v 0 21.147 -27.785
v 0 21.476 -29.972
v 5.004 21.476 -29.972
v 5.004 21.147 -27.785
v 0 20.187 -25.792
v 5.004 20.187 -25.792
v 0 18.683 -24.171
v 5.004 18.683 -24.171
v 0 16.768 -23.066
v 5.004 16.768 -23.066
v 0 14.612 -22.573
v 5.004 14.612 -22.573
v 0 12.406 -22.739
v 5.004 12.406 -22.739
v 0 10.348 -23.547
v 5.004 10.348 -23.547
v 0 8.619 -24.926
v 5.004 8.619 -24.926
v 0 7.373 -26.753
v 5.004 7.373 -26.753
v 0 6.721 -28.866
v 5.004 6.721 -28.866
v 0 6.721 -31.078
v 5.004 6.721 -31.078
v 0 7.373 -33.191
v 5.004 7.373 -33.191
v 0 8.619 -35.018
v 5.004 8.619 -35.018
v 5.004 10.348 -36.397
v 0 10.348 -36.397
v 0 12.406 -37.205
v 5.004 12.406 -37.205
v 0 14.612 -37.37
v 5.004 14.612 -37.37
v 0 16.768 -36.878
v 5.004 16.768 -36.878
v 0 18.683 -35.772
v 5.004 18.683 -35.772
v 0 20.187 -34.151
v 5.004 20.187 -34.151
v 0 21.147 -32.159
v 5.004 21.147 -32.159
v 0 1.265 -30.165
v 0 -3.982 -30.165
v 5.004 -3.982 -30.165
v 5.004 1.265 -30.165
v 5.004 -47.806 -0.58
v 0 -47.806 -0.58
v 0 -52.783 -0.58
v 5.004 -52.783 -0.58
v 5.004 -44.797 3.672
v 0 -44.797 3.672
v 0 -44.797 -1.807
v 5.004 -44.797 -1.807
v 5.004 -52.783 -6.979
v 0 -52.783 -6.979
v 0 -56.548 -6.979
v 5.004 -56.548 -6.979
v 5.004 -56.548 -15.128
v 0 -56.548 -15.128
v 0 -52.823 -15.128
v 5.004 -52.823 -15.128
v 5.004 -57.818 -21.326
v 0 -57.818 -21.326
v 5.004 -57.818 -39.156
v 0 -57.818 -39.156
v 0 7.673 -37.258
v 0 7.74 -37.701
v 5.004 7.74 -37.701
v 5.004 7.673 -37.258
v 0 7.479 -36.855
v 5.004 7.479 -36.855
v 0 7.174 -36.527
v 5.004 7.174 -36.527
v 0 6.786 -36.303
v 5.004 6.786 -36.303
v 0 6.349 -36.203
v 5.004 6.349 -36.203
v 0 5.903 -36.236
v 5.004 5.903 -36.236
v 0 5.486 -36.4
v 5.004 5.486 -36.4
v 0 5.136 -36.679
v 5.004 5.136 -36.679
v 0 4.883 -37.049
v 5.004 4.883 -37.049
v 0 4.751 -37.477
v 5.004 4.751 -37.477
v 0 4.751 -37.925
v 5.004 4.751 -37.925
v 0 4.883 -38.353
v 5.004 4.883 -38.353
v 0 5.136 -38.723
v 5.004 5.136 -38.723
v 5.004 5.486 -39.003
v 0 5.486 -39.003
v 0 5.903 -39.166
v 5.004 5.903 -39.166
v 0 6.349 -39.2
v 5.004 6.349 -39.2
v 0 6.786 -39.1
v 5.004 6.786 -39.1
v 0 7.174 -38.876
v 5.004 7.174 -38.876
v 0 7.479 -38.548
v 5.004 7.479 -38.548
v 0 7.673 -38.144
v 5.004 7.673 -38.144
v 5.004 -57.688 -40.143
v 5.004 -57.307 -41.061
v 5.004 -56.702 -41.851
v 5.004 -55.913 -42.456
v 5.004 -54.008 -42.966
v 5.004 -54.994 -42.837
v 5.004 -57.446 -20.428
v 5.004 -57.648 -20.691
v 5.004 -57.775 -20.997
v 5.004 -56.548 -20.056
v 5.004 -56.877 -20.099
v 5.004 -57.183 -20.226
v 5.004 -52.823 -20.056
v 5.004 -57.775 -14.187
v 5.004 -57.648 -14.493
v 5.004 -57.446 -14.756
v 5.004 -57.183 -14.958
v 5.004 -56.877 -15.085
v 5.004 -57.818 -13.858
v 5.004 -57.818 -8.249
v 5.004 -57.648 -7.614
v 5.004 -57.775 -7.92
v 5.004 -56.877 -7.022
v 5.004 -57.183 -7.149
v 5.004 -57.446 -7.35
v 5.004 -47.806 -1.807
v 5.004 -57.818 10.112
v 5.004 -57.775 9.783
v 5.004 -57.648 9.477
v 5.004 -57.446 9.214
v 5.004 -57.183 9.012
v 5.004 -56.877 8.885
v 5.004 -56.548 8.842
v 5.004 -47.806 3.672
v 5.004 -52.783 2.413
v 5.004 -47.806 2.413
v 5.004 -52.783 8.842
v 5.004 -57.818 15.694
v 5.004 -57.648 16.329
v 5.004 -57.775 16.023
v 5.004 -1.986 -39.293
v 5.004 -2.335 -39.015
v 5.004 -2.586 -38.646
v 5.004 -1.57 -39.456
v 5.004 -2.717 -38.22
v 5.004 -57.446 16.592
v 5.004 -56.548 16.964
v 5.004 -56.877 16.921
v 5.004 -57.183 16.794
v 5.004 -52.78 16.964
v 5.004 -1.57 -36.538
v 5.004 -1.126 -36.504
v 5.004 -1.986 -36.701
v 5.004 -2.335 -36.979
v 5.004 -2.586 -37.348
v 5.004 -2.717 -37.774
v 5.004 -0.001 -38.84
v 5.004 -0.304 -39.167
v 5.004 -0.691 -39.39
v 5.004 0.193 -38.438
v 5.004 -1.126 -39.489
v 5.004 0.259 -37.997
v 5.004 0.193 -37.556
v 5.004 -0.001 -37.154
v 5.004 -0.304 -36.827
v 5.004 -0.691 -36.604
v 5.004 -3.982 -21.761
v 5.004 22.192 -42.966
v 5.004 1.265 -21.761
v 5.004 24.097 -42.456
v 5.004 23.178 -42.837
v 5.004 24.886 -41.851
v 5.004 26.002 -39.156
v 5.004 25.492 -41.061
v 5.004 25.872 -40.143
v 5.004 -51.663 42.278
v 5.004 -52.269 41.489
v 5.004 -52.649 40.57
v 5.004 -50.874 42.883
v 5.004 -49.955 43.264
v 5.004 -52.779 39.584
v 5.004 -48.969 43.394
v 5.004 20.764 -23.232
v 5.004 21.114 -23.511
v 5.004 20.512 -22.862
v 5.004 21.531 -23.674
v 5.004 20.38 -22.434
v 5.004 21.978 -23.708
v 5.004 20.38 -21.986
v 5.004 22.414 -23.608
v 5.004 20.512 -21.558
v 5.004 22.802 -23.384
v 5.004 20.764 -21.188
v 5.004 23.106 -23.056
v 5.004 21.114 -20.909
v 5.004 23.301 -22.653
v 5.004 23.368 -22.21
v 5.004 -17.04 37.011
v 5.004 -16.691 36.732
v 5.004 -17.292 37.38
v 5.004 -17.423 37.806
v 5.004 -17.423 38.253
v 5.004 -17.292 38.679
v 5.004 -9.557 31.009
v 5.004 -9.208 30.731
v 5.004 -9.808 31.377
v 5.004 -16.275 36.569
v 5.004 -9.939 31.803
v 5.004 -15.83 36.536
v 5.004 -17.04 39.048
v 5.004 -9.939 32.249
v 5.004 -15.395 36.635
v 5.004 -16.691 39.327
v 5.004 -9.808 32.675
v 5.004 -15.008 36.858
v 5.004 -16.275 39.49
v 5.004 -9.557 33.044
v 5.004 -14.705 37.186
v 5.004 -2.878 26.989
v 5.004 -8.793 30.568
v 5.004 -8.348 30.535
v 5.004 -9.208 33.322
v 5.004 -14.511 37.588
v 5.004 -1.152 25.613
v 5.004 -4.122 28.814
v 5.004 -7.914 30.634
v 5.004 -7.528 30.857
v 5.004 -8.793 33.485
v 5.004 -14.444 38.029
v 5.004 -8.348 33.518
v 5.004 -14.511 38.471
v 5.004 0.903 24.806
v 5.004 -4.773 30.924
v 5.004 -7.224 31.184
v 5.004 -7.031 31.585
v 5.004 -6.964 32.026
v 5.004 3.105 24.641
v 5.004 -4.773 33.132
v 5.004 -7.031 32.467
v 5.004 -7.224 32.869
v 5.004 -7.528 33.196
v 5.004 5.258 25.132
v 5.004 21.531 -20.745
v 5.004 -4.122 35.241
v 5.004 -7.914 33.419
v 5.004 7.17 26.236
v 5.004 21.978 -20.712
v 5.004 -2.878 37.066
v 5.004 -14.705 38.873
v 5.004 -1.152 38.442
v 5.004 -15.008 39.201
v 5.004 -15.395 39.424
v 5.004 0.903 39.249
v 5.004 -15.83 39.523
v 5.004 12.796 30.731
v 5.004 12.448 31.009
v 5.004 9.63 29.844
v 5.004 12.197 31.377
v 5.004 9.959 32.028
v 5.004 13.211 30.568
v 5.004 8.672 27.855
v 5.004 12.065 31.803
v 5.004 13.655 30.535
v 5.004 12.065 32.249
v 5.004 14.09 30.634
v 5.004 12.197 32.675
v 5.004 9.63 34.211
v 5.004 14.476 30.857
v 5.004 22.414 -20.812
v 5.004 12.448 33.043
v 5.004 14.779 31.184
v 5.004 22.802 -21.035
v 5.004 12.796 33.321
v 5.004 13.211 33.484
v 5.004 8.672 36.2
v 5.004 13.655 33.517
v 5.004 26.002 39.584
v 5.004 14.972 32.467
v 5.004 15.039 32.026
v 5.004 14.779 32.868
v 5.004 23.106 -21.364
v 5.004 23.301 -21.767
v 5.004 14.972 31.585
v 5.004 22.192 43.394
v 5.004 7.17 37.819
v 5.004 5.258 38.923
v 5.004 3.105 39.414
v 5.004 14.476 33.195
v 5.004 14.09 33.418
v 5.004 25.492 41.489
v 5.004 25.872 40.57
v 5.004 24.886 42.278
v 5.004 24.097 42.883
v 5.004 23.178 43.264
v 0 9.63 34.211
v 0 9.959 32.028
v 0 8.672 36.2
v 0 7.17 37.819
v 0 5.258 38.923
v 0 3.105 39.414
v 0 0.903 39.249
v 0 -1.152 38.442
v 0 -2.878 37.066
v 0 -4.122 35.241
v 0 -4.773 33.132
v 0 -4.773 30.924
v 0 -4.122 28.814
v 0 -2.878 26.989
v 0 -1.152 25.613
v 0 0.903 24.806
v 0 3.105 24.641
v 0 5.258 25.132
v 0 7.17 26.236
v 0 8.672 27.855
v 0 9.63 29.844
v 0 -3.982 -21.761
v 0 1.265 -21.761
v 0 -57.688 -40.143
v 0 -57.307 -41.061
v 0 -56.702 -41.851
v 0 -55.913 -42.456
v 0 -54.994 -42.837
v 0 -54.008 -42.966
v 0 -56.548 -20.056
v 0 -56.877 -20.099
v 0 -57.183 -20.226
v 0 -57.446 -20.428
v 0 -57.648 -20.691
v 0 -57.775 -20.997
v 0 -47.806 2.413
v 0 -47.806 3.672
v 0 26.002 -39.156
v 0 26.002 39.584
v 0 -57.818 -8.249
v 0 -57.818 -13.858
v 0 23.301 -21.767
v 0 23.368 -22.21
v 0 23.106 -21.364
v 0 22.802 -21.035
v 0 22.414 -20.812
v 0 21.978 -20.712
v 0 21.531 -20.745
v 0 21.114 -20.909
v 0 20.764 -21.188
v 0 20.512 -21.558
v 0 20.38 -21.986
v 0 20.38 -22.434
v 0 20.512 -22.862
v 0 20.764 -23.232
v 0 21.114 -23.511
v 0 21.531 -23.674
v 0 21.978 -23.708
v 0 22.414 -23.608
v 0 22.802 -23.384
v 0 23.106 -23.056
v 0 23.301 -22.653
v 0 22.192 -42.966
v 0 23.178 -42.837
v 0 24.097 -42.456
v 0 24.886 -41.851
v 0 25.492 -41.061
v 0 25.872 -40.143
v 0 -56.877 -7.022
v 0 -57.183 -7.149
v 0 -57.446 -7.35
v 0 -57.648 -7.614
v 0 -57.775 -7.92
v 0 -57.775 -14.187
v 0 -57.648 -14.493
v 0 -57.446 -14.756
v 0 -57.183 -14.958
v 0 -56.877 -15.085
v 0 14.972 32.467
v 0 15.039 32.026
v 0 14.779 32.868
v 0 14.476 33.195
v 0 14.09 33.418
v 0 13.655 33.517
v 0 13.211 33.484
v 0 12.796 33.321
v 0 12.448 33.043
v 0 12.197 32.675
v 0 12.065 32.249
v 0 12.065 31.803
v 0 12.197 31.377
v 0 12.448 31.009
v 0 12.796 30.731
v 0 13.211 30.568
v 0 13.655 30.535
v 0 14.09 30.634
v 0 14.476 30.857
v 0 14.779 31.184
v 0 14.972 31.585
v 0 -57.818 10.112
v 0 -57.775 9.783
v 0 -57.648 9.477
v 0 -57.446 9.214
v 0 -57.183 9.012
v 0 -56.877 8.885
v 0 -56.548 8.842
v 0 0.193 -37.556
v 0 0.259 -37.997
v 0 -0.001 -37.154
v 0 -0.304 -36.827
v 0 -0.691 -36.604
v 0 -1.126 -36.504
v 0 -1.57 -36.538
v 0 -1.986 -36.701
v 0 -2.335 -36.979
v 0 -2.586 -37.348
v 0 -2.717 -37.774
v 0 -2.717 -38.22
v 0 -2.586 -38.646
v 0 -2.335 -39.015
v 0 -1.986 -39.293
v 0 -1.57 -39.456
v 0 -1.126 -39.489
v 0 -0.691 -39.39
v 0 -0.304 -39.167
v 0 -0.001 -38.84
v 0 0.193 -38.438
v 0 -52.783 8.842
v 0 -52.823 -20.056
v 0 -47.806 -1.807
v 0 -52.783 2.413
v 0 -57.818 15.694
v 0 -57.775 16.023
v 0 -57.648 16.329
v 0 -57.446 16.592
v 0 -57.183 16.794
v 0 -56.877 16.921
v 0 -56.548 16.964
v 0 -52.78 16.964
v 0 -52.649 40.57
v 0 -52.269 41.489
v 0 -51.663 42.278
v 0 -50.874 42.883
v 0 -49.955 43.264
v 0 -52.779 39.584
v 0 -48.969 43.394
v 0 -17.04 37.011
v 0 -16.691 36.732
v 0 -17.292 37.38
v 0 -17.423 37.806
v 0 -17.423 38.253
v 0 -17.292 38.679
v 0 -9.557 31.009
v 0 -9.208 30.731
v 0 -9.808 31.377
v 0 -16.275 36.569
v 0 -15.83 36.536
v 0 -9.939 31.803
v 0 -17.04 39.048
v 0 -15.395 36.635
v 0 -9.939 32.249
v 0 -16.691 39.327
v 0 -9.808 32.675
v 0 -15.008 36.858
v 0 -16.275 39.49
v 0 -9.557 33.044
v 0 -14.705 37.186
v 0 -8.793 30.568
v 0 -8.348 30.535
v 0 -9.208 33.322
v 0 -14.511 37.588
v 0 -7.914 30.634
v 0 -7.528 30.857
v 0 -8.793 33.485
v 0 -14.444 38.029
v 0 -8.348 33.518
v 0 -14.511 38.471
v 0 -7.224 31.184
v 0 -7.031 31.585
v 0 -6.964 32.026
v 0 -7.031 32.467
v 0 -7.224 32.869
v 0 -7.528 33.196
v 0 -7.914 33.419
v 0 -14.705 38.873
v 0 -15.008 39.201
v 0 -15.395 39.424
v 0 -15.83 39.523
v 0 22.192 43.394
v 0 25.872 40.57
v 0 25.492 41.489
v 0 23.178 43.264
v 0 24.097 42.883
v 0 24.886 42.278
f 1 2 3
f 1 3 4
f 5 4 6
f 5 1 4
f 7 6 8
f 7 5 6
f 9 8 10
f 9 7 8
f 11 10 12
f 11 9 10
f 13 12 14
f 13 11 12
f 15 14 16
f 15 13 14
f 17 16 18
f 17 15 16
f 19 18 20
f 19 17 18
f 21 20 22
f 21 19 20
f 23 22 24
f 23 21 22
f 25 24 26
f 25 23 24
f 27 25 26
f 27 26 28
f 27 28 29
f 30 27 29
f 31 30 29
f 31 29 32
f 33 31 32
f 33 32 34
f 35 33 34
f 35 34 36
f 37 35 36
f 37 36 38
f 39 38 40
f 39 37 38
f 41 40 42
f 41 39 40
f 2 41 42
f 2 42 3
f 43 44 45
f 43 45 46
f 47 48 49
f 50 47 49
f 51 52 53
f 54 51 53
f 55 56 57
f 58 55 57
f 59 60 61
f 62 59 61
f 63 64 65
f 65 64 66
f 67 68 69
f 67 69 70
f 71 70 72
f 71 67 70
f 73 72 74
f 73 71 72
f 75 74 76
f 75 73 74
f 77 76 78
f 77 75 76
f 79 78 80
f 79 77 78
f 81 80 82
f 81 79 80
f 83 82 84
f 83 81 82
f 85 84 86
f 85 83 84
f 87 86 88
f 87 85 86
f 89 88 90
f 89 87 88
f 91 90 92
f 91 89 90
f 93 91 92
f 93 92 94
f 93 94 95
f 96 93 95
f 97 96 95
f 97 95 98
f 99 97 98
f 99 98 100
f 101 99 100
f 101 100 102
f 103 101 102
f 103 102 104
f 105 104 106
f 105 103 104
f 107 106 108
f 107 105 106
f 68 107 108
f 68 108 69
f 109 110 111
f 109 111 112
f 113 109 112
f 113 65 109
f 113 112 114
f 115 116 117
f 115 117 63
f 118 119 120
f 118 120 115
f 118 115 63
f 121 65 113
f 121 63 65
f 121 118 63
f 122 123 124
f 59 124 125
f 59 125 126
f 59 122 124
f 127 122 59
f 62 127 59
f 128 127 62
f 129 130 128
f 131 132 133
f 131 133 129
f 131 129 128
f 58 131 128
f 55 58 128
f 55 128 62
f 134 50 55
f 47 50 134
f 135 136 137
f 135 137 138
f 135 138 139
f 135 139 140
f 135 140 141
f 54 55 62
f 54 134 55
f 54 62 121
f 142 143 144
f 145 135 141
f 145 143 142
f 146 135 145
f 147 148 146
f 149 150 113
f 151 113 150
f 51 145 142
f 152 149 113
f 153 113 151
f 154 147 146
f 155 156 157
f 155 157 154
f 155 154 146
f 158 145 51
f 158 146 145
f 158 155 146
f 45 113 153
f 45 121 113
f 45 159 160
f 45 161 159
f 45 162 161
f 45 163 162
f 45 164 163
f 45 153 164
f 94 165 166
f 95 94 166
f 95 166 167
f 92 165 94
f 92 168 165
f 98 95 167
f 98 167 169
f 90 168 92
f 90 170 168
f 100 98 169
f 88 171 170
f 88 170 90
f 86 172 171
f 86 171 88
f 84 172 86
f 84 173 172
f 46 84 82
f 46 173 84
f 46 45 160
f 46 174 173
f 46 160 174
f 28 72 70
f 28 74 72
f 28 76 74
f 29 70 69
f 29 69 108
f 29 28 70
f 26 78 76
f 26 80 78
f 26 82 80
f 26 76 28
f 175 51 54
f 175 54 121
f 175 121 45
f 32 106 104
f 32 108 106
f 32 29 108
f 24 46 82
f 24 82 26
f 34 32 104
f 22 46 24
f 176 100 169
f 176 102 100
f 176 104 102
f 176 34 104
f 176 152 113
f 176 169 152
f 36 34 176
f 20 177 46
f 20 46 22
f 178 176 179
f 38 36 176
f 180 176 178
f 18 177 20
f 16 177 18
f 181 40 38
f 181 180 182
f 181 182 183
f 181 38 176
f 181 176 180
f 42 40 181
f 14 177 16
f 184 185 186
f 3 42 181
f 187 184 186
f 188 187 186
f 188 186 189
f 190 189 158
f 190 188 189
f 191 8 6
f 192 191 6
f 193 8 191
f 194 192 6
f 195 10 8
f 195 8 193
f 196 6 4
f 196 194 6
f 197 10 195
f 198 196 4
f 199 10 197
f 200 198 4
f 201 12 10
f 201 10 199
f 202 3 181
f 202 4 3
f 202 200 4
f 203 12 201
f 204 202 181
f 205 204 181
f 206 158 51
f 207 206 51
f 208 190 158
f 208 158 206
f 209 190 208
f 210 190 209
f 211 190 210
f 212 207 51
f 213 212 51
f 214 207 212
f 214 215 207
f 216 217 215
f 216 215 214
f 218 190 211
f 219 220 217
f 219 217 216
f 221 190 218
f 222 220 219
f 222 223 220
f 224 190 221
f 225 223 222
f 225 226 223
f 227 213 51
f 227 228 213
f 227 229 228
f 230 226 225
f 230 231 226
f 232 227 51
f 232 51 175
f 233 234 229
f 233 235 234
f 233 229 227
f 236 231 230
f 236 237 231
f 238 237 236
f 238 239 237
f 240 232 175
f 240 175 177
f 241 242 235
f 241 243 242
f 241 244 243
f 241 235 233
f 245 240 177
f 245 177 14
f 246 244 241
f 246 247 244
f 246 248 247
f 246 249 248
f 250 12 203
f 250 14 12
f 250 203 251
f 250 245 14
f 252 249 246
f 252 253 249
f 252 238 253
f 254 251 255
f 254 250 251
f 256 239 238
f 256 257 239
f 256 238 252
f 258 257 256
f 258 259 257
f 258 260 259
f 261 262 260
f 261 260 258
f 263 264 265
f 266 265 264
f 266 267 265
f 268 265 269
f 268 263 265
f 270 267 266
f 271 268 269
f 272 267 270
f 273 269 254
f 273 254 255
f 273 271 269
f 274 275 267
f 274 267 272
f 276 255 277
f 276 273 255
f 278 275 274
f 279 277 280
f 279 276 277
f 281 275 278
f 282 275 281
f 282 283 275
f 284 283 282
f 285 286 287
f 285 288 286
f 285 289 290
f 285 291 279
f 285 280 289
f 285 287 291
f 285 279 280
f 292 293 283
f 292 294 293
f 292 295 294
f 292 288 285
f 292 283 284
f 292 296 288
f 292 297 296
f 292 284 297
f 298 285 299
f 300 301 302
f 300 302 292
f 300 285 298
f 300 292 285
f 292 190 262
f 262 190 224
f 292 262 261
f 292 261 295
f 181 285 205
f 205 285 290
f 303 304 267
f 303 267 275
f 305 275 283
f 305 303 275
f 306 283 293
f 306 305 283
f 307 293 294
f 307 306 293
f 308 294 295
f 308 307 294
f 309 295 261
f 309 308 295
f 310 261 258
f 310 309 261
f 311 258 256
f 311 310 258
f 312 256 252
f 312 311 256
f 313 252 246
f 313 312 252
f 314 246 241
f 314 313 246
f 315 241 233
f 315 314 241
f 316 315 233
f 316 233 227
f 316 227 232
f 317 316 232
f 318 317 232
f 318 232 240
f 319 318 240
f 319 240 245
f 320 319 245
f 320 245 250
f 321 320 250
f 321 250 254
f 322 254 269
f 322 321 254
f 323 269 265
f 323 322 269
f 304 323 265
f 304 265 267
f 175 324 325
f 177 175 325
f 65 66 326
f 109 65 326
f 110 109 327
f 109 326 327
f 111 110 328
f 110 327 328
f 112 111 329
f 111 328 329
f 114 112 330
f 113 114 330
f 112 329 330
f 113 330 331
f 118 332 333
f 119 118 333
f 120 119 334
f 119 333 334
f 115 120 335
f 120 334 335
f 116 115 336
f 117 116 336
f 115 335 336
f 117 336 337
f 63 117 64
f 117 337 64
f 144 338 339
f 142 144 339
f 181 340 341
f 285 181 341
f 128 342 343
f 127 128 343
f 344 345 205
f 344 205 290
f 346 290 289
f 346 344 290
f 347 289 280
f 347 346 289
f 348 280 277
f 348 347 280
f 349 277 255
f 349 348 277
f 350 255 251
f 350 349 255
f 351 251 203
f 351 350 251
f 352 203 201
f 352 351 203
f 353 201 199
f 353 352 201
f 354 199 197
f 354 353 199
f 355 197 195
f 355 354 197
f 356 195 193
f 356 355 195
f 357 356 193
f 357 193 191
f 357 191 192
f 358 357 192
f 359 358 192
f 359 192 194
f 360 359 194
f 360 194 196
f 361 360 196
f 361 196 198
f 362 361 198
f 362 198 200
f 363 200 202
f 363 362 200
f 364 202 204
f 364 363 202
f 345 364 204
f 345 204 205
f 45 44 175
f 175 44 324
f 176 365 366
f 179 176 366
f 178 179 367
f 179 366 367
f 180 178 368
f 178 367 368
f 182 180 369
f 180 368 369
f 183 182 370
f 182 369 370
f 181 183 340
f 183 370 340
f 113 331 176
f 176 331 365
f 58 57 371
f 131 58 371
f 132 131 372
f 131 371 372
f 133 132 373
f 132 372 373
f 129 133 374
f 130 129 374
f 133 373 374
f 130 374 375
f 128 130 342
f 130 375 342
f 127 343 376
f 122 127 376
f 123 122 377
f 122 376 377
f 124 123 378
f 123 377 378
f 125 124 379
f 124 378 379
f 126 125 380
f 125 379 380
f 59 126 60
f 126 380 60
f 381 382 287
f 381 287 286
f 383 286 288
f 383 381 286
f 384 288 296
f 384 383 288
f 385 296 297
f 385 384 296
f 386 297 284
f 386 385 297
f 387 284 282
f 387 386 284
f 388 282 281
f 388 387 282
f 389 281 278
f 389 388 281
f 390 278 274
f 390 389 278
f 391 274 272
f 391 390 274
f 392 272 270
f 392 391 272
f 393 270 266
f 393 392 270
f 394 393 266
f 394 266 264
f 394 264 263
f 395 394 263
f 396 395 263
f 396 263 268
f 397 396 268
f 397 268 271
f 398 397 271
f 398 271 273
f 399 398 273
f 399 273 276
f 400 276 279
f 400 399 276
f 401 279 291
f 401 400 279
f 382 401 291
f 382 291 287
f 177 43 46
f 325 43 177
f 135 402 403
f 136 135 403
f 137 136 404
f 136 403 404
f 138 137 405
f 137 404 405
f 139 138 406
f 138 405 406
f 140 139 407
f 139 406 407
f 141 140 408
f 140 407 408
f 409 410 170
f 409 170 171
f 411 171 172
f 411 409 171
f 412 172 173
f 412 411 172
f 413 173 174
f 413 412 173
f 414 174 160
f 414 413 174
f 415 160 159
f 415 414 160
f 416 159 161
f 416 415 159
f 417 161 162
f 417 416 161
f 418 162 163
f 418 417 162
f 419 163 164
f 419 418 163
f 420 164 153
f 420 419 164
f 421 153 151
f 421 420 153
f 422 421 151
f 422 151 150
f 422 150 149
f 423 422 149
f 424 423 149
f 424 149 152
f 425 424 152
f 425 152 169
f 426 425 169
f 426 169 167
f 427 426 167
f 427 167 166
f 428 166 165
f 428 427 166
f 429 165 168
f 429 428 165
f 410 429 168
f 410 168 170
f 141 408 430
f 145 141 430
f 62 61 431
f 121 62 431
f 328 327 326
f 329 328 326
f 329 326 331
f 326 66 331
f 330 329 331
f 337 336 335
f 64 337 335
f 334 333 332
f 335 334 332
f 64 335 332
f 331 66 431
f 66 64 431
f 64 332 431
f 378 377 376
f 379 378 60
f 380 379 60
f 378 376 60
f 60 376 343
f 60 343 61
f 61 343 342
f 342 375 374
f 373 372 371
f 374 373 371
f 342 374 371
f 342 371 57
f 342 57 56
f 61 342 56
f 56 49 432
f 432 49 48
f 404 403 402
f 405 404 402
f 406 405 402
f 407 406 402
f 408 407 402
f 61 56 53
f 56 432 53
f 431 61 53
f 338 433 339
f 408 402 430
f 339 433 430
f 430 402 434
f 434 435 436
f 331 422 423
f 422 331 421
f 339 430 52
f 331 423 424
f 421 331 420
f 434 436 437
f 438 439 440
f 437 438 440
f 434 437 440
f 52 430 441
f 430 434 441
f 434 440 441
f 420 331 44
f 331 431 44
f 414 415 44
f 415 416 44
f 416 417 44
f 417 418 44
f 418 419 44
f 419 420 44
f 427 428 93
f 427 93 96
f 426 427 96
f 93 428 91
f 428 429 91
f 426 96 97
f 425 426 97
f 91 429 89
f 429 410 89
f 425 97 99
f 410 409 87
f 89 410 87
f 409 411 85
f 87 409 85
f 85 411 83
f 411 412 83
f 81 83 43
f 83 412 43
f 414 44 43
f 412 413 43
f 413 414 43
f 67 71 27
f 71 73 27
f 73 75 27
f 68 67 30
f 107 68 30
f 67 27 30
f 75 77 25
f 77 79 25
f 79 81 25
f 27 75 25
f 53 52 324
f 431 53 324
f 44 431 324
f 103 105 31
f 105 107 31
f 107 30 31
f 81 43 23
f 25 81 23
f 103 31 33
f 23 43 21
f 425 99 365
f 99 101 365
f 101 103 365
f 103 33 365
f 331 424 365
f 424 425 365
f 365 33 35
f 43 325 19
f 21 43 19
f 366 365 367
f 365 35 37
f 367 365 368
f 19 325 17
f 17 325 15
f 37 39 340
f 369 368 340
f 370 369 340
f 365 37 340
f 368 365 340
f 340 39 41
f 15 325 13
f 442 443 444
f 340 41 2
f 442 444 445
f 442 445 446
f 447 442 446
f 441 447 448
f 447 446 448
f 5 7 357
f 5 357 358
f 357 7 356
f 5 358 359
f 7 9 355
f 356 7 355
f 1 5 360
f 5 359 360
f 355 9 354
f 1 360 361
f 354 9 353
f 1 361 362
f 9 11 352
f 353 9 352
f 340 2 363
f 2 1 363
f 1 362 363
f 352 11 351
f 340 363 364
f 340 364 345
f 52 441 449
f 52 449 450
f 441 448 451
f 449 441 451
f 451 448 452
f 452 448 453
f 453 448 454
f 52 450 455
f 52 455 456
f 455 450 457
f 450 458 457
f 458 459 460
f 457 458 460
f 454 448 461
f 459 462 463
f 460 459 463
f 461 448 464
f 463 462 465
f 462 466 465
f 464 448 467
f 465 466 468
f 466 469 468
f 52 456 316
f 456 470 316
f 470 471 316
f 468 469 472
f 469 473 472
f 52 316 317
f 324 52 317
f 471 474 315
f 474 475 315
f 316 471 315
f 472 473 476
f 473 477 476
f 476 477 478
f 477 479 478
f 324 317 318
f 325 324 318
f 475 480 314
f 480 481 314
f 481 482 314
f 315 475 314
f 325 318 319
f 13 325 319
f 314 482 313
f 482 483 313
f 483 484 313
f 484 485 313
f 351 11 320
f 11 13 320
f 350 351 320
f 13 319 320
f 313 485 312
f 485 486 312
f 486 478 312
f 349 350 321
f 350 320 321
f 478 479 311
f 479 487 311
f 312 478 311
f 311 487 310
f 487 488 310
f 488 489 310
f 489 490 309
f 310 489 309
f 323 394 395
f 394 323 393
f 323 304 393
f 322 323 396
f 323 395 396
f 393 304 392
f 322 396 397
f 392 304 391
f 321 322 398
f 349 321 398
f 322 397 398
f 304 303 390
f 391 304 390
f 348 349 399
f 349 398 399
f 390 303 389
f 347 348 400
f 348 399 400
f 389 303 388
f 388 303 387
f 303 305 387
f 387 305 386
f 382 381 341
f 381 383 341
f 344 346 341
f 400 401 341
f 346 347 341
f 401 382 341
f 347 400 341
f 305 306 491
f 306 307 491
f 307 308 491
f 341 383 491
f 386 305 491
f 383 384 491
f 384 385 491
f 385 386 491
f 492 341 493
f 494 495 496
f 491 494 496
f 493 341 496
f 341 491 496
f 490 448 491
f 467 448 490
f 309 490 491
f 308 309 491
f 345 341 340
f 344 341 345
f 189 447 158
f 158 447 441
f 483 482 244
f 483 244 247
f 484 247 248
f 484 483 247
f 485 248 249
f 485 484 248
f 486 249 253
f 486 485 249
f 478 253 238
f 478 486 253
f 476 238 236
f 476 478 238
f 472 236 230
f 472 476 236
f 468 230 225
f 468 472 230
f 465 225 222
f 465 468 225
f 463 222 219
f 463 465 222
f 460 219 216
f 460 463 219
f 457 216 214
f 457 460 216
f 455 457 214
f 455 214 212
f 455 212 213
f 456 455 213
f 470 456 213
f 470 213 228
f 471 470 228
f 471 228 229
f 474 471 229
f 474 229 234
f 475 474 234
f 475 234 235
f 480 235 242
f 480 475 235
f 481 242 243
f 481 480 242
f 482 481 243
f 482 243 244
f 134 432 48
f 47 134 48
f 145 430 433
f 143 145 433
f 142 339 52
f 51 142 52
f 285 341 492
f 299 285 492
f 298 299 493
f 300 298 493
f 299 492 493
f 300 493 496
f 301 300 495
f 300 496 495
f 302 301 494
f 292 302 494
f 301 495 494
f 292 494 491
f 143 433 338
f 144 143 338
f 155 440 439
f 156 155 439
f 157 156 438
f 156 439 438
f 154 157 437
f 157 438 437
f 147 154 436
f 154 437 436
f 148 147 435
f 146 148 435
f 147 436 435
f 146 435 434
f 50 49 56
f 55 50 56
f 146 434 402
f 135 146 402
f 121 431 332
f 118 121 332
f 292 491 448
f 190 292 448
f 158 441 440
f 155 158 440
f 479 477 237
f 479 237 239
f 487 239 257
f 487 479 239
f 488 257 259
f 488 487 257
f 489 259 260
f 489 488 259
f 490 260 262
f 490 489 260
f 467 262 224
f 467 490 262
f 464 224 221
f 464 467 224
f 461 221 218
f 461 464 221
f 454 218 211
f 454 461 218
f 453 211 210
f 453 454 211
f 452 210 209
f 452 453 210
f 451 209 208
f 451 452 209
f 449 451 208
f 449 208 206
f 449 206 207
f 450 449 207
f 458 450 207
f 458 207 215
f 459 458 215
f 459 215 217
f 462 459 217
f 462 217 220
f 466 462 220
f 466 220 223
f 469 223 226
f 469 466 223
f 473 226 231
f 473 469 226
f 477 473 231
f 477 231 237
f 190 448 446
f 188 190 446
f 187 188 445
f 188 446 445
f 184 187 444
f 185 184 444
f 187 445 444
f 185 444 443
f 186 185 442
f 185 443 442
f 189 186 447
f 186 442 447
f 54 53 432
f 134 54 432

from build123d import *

# Parameters (mm, degrees)
F0_R     = 1.496682
F0_W     = 5.246993
F0_H     = 8.403182
F0_R_2   = 1.502637
F0_R_3   = 7.419122
F0_R_4   = 1.50217
F0_R_5   = 1.497826
F0_R_6   = 1.495866
F0_R_7   = 7.407283
F0_R_8   = 1.495199
F1_DEPTH = 5.0038


with BuildPart() as f1:
    # F0 (on Right) → F1 (new body)
    with BuildSketch(Plane.YZ):
        with BuildLine():
            ThreePointArc((26.002148, 39.583533), (24.886225, 42.27761), (22.192148, 43.393533))
            Line((22.192148, 43.393533), (-48.969212, 43.393533))
            ThreePointArc((-48.969212, 43.393533), (-51.663225, 42.277674), (-52.779212, 39.583715))
            Line((-52.779212, 39.583715), (-52.780295, 16.96425))
            Line((-52.780295, 16.96425), (-56.547852, 16.96425))
            ThreePointArc((-56.547852, 16.96425), (-57.445878, 16.592276), (-57.817852, 15.69425))
            Line((-57.817852, 15.69425), (-57.817852, 10.11156))
            ThreePointArc((-57.817852, 10.11156), (-57.445878, 9.213534), (-56.547852, 8.84156))
            Line((-56.547852, 8.84156), (-52.783472, 8.84156))
            Line((-52.783472, 8.84156), (-52.783472, 2.413221))
            Line((-52.783472, 2.413221), (-47.806354, 2.413221))
            Line((-47.806354, 2.413221), (-47.806354, 3.672259))
            Line((-47.806354, 3.672259), (-44.797333, 3.672259))
            Line((-44.797333, 3.672259), (-44.797333, -1.80733))
            Line((-44.797333, -1.80733), (-47.806354, -1.80733))
            Line((-47.806354, -1.80733), (-47.806354, -0.579965))
            Line((-47.806354, -0.579965), (-52.783472, -0.579965))
            Line((-52.783472, -0.579965), (-52.783472, -6.978519))
            Line((-52.783472, -6.978519), (-56.547852, -6.978519))
            ThreePointArc((-56.547852, -6.978519), (-57.445878, -7.350493), (-57.817852, -8.248519))
            Line((-57.817852, -8.248519), (-57.817852, -13.858365))
            ThreePointArc((-57.817852, -13.858365), (-57.445878, -14.756391), (-56.547852, -15.128365))
            Line((-56.547852, -15.128365), (-52.823355, -15.128365))
            Line((-52.823355, -15.128365), (-52.823355, -20.055671))
            Line((-52.823355, -20.055671), (-56.547852, -20.055671))
            ThreePointArc((-56.547852, -20.055671), (-57.445878, -20.427646), (-57.817852, -21.325671))
            Line((-57.817852, -21.325671), (-57.817852, -39.156467))
            ThreePointArc((-57.817852, -39.156467), (-56.701929, -41.850544), (-54.007852, -42.966467))
            Line((-54.007852, -42.966467), (22.192148, -42.966467))
            ThreePointArc((22.192148, -42.966467), (24.886225, -41.850544), (26.002148, -39.156467))
            Line((26.002148, -39.156467), (26.002148, 39.583533))
        make_face()
        with Locations((-1.237392, -37.996951)):
            Circle(F0_R, mode=Mode.SUBTRACT)
        with Locations((-1.358906, -25.962943)):
            Rectangle(F0_W, F0_H, mode=Mode.SUBTRACT)
        with Locations((6.237176, -37.701346)):
            Circle(F0_R_2, mode=Mode.SUBTRACT)
        with Locations((14.057356, -29.971829)):
            Circle(F0_R_3, mode=Mode.SUBTRACT)
        with Locations((21.865347, -22.209868)):
            Circle(F0_R_4, mode=Mode.SUBTRACT)
        with Locations((-15.942187, 38.029493)):
            Circle(F0_R_5, mode=Mode.SUBTRACT)
        with Locations((-8.460167, 32.026364)):
            Circle(F0_R_6, mode=Mode.SUBTRACT)
        with Locations((2.551726, 32.02758)):
            Circle(F0_R_7, mode=Mode.SUBTRACT)
        with Locations((13.543643, 32.025907)):
            Circle(F0_R_8, mode=Mode.SUBTRACT)
    extrude(amount=F1_DEPTH)


solid = f1.part
